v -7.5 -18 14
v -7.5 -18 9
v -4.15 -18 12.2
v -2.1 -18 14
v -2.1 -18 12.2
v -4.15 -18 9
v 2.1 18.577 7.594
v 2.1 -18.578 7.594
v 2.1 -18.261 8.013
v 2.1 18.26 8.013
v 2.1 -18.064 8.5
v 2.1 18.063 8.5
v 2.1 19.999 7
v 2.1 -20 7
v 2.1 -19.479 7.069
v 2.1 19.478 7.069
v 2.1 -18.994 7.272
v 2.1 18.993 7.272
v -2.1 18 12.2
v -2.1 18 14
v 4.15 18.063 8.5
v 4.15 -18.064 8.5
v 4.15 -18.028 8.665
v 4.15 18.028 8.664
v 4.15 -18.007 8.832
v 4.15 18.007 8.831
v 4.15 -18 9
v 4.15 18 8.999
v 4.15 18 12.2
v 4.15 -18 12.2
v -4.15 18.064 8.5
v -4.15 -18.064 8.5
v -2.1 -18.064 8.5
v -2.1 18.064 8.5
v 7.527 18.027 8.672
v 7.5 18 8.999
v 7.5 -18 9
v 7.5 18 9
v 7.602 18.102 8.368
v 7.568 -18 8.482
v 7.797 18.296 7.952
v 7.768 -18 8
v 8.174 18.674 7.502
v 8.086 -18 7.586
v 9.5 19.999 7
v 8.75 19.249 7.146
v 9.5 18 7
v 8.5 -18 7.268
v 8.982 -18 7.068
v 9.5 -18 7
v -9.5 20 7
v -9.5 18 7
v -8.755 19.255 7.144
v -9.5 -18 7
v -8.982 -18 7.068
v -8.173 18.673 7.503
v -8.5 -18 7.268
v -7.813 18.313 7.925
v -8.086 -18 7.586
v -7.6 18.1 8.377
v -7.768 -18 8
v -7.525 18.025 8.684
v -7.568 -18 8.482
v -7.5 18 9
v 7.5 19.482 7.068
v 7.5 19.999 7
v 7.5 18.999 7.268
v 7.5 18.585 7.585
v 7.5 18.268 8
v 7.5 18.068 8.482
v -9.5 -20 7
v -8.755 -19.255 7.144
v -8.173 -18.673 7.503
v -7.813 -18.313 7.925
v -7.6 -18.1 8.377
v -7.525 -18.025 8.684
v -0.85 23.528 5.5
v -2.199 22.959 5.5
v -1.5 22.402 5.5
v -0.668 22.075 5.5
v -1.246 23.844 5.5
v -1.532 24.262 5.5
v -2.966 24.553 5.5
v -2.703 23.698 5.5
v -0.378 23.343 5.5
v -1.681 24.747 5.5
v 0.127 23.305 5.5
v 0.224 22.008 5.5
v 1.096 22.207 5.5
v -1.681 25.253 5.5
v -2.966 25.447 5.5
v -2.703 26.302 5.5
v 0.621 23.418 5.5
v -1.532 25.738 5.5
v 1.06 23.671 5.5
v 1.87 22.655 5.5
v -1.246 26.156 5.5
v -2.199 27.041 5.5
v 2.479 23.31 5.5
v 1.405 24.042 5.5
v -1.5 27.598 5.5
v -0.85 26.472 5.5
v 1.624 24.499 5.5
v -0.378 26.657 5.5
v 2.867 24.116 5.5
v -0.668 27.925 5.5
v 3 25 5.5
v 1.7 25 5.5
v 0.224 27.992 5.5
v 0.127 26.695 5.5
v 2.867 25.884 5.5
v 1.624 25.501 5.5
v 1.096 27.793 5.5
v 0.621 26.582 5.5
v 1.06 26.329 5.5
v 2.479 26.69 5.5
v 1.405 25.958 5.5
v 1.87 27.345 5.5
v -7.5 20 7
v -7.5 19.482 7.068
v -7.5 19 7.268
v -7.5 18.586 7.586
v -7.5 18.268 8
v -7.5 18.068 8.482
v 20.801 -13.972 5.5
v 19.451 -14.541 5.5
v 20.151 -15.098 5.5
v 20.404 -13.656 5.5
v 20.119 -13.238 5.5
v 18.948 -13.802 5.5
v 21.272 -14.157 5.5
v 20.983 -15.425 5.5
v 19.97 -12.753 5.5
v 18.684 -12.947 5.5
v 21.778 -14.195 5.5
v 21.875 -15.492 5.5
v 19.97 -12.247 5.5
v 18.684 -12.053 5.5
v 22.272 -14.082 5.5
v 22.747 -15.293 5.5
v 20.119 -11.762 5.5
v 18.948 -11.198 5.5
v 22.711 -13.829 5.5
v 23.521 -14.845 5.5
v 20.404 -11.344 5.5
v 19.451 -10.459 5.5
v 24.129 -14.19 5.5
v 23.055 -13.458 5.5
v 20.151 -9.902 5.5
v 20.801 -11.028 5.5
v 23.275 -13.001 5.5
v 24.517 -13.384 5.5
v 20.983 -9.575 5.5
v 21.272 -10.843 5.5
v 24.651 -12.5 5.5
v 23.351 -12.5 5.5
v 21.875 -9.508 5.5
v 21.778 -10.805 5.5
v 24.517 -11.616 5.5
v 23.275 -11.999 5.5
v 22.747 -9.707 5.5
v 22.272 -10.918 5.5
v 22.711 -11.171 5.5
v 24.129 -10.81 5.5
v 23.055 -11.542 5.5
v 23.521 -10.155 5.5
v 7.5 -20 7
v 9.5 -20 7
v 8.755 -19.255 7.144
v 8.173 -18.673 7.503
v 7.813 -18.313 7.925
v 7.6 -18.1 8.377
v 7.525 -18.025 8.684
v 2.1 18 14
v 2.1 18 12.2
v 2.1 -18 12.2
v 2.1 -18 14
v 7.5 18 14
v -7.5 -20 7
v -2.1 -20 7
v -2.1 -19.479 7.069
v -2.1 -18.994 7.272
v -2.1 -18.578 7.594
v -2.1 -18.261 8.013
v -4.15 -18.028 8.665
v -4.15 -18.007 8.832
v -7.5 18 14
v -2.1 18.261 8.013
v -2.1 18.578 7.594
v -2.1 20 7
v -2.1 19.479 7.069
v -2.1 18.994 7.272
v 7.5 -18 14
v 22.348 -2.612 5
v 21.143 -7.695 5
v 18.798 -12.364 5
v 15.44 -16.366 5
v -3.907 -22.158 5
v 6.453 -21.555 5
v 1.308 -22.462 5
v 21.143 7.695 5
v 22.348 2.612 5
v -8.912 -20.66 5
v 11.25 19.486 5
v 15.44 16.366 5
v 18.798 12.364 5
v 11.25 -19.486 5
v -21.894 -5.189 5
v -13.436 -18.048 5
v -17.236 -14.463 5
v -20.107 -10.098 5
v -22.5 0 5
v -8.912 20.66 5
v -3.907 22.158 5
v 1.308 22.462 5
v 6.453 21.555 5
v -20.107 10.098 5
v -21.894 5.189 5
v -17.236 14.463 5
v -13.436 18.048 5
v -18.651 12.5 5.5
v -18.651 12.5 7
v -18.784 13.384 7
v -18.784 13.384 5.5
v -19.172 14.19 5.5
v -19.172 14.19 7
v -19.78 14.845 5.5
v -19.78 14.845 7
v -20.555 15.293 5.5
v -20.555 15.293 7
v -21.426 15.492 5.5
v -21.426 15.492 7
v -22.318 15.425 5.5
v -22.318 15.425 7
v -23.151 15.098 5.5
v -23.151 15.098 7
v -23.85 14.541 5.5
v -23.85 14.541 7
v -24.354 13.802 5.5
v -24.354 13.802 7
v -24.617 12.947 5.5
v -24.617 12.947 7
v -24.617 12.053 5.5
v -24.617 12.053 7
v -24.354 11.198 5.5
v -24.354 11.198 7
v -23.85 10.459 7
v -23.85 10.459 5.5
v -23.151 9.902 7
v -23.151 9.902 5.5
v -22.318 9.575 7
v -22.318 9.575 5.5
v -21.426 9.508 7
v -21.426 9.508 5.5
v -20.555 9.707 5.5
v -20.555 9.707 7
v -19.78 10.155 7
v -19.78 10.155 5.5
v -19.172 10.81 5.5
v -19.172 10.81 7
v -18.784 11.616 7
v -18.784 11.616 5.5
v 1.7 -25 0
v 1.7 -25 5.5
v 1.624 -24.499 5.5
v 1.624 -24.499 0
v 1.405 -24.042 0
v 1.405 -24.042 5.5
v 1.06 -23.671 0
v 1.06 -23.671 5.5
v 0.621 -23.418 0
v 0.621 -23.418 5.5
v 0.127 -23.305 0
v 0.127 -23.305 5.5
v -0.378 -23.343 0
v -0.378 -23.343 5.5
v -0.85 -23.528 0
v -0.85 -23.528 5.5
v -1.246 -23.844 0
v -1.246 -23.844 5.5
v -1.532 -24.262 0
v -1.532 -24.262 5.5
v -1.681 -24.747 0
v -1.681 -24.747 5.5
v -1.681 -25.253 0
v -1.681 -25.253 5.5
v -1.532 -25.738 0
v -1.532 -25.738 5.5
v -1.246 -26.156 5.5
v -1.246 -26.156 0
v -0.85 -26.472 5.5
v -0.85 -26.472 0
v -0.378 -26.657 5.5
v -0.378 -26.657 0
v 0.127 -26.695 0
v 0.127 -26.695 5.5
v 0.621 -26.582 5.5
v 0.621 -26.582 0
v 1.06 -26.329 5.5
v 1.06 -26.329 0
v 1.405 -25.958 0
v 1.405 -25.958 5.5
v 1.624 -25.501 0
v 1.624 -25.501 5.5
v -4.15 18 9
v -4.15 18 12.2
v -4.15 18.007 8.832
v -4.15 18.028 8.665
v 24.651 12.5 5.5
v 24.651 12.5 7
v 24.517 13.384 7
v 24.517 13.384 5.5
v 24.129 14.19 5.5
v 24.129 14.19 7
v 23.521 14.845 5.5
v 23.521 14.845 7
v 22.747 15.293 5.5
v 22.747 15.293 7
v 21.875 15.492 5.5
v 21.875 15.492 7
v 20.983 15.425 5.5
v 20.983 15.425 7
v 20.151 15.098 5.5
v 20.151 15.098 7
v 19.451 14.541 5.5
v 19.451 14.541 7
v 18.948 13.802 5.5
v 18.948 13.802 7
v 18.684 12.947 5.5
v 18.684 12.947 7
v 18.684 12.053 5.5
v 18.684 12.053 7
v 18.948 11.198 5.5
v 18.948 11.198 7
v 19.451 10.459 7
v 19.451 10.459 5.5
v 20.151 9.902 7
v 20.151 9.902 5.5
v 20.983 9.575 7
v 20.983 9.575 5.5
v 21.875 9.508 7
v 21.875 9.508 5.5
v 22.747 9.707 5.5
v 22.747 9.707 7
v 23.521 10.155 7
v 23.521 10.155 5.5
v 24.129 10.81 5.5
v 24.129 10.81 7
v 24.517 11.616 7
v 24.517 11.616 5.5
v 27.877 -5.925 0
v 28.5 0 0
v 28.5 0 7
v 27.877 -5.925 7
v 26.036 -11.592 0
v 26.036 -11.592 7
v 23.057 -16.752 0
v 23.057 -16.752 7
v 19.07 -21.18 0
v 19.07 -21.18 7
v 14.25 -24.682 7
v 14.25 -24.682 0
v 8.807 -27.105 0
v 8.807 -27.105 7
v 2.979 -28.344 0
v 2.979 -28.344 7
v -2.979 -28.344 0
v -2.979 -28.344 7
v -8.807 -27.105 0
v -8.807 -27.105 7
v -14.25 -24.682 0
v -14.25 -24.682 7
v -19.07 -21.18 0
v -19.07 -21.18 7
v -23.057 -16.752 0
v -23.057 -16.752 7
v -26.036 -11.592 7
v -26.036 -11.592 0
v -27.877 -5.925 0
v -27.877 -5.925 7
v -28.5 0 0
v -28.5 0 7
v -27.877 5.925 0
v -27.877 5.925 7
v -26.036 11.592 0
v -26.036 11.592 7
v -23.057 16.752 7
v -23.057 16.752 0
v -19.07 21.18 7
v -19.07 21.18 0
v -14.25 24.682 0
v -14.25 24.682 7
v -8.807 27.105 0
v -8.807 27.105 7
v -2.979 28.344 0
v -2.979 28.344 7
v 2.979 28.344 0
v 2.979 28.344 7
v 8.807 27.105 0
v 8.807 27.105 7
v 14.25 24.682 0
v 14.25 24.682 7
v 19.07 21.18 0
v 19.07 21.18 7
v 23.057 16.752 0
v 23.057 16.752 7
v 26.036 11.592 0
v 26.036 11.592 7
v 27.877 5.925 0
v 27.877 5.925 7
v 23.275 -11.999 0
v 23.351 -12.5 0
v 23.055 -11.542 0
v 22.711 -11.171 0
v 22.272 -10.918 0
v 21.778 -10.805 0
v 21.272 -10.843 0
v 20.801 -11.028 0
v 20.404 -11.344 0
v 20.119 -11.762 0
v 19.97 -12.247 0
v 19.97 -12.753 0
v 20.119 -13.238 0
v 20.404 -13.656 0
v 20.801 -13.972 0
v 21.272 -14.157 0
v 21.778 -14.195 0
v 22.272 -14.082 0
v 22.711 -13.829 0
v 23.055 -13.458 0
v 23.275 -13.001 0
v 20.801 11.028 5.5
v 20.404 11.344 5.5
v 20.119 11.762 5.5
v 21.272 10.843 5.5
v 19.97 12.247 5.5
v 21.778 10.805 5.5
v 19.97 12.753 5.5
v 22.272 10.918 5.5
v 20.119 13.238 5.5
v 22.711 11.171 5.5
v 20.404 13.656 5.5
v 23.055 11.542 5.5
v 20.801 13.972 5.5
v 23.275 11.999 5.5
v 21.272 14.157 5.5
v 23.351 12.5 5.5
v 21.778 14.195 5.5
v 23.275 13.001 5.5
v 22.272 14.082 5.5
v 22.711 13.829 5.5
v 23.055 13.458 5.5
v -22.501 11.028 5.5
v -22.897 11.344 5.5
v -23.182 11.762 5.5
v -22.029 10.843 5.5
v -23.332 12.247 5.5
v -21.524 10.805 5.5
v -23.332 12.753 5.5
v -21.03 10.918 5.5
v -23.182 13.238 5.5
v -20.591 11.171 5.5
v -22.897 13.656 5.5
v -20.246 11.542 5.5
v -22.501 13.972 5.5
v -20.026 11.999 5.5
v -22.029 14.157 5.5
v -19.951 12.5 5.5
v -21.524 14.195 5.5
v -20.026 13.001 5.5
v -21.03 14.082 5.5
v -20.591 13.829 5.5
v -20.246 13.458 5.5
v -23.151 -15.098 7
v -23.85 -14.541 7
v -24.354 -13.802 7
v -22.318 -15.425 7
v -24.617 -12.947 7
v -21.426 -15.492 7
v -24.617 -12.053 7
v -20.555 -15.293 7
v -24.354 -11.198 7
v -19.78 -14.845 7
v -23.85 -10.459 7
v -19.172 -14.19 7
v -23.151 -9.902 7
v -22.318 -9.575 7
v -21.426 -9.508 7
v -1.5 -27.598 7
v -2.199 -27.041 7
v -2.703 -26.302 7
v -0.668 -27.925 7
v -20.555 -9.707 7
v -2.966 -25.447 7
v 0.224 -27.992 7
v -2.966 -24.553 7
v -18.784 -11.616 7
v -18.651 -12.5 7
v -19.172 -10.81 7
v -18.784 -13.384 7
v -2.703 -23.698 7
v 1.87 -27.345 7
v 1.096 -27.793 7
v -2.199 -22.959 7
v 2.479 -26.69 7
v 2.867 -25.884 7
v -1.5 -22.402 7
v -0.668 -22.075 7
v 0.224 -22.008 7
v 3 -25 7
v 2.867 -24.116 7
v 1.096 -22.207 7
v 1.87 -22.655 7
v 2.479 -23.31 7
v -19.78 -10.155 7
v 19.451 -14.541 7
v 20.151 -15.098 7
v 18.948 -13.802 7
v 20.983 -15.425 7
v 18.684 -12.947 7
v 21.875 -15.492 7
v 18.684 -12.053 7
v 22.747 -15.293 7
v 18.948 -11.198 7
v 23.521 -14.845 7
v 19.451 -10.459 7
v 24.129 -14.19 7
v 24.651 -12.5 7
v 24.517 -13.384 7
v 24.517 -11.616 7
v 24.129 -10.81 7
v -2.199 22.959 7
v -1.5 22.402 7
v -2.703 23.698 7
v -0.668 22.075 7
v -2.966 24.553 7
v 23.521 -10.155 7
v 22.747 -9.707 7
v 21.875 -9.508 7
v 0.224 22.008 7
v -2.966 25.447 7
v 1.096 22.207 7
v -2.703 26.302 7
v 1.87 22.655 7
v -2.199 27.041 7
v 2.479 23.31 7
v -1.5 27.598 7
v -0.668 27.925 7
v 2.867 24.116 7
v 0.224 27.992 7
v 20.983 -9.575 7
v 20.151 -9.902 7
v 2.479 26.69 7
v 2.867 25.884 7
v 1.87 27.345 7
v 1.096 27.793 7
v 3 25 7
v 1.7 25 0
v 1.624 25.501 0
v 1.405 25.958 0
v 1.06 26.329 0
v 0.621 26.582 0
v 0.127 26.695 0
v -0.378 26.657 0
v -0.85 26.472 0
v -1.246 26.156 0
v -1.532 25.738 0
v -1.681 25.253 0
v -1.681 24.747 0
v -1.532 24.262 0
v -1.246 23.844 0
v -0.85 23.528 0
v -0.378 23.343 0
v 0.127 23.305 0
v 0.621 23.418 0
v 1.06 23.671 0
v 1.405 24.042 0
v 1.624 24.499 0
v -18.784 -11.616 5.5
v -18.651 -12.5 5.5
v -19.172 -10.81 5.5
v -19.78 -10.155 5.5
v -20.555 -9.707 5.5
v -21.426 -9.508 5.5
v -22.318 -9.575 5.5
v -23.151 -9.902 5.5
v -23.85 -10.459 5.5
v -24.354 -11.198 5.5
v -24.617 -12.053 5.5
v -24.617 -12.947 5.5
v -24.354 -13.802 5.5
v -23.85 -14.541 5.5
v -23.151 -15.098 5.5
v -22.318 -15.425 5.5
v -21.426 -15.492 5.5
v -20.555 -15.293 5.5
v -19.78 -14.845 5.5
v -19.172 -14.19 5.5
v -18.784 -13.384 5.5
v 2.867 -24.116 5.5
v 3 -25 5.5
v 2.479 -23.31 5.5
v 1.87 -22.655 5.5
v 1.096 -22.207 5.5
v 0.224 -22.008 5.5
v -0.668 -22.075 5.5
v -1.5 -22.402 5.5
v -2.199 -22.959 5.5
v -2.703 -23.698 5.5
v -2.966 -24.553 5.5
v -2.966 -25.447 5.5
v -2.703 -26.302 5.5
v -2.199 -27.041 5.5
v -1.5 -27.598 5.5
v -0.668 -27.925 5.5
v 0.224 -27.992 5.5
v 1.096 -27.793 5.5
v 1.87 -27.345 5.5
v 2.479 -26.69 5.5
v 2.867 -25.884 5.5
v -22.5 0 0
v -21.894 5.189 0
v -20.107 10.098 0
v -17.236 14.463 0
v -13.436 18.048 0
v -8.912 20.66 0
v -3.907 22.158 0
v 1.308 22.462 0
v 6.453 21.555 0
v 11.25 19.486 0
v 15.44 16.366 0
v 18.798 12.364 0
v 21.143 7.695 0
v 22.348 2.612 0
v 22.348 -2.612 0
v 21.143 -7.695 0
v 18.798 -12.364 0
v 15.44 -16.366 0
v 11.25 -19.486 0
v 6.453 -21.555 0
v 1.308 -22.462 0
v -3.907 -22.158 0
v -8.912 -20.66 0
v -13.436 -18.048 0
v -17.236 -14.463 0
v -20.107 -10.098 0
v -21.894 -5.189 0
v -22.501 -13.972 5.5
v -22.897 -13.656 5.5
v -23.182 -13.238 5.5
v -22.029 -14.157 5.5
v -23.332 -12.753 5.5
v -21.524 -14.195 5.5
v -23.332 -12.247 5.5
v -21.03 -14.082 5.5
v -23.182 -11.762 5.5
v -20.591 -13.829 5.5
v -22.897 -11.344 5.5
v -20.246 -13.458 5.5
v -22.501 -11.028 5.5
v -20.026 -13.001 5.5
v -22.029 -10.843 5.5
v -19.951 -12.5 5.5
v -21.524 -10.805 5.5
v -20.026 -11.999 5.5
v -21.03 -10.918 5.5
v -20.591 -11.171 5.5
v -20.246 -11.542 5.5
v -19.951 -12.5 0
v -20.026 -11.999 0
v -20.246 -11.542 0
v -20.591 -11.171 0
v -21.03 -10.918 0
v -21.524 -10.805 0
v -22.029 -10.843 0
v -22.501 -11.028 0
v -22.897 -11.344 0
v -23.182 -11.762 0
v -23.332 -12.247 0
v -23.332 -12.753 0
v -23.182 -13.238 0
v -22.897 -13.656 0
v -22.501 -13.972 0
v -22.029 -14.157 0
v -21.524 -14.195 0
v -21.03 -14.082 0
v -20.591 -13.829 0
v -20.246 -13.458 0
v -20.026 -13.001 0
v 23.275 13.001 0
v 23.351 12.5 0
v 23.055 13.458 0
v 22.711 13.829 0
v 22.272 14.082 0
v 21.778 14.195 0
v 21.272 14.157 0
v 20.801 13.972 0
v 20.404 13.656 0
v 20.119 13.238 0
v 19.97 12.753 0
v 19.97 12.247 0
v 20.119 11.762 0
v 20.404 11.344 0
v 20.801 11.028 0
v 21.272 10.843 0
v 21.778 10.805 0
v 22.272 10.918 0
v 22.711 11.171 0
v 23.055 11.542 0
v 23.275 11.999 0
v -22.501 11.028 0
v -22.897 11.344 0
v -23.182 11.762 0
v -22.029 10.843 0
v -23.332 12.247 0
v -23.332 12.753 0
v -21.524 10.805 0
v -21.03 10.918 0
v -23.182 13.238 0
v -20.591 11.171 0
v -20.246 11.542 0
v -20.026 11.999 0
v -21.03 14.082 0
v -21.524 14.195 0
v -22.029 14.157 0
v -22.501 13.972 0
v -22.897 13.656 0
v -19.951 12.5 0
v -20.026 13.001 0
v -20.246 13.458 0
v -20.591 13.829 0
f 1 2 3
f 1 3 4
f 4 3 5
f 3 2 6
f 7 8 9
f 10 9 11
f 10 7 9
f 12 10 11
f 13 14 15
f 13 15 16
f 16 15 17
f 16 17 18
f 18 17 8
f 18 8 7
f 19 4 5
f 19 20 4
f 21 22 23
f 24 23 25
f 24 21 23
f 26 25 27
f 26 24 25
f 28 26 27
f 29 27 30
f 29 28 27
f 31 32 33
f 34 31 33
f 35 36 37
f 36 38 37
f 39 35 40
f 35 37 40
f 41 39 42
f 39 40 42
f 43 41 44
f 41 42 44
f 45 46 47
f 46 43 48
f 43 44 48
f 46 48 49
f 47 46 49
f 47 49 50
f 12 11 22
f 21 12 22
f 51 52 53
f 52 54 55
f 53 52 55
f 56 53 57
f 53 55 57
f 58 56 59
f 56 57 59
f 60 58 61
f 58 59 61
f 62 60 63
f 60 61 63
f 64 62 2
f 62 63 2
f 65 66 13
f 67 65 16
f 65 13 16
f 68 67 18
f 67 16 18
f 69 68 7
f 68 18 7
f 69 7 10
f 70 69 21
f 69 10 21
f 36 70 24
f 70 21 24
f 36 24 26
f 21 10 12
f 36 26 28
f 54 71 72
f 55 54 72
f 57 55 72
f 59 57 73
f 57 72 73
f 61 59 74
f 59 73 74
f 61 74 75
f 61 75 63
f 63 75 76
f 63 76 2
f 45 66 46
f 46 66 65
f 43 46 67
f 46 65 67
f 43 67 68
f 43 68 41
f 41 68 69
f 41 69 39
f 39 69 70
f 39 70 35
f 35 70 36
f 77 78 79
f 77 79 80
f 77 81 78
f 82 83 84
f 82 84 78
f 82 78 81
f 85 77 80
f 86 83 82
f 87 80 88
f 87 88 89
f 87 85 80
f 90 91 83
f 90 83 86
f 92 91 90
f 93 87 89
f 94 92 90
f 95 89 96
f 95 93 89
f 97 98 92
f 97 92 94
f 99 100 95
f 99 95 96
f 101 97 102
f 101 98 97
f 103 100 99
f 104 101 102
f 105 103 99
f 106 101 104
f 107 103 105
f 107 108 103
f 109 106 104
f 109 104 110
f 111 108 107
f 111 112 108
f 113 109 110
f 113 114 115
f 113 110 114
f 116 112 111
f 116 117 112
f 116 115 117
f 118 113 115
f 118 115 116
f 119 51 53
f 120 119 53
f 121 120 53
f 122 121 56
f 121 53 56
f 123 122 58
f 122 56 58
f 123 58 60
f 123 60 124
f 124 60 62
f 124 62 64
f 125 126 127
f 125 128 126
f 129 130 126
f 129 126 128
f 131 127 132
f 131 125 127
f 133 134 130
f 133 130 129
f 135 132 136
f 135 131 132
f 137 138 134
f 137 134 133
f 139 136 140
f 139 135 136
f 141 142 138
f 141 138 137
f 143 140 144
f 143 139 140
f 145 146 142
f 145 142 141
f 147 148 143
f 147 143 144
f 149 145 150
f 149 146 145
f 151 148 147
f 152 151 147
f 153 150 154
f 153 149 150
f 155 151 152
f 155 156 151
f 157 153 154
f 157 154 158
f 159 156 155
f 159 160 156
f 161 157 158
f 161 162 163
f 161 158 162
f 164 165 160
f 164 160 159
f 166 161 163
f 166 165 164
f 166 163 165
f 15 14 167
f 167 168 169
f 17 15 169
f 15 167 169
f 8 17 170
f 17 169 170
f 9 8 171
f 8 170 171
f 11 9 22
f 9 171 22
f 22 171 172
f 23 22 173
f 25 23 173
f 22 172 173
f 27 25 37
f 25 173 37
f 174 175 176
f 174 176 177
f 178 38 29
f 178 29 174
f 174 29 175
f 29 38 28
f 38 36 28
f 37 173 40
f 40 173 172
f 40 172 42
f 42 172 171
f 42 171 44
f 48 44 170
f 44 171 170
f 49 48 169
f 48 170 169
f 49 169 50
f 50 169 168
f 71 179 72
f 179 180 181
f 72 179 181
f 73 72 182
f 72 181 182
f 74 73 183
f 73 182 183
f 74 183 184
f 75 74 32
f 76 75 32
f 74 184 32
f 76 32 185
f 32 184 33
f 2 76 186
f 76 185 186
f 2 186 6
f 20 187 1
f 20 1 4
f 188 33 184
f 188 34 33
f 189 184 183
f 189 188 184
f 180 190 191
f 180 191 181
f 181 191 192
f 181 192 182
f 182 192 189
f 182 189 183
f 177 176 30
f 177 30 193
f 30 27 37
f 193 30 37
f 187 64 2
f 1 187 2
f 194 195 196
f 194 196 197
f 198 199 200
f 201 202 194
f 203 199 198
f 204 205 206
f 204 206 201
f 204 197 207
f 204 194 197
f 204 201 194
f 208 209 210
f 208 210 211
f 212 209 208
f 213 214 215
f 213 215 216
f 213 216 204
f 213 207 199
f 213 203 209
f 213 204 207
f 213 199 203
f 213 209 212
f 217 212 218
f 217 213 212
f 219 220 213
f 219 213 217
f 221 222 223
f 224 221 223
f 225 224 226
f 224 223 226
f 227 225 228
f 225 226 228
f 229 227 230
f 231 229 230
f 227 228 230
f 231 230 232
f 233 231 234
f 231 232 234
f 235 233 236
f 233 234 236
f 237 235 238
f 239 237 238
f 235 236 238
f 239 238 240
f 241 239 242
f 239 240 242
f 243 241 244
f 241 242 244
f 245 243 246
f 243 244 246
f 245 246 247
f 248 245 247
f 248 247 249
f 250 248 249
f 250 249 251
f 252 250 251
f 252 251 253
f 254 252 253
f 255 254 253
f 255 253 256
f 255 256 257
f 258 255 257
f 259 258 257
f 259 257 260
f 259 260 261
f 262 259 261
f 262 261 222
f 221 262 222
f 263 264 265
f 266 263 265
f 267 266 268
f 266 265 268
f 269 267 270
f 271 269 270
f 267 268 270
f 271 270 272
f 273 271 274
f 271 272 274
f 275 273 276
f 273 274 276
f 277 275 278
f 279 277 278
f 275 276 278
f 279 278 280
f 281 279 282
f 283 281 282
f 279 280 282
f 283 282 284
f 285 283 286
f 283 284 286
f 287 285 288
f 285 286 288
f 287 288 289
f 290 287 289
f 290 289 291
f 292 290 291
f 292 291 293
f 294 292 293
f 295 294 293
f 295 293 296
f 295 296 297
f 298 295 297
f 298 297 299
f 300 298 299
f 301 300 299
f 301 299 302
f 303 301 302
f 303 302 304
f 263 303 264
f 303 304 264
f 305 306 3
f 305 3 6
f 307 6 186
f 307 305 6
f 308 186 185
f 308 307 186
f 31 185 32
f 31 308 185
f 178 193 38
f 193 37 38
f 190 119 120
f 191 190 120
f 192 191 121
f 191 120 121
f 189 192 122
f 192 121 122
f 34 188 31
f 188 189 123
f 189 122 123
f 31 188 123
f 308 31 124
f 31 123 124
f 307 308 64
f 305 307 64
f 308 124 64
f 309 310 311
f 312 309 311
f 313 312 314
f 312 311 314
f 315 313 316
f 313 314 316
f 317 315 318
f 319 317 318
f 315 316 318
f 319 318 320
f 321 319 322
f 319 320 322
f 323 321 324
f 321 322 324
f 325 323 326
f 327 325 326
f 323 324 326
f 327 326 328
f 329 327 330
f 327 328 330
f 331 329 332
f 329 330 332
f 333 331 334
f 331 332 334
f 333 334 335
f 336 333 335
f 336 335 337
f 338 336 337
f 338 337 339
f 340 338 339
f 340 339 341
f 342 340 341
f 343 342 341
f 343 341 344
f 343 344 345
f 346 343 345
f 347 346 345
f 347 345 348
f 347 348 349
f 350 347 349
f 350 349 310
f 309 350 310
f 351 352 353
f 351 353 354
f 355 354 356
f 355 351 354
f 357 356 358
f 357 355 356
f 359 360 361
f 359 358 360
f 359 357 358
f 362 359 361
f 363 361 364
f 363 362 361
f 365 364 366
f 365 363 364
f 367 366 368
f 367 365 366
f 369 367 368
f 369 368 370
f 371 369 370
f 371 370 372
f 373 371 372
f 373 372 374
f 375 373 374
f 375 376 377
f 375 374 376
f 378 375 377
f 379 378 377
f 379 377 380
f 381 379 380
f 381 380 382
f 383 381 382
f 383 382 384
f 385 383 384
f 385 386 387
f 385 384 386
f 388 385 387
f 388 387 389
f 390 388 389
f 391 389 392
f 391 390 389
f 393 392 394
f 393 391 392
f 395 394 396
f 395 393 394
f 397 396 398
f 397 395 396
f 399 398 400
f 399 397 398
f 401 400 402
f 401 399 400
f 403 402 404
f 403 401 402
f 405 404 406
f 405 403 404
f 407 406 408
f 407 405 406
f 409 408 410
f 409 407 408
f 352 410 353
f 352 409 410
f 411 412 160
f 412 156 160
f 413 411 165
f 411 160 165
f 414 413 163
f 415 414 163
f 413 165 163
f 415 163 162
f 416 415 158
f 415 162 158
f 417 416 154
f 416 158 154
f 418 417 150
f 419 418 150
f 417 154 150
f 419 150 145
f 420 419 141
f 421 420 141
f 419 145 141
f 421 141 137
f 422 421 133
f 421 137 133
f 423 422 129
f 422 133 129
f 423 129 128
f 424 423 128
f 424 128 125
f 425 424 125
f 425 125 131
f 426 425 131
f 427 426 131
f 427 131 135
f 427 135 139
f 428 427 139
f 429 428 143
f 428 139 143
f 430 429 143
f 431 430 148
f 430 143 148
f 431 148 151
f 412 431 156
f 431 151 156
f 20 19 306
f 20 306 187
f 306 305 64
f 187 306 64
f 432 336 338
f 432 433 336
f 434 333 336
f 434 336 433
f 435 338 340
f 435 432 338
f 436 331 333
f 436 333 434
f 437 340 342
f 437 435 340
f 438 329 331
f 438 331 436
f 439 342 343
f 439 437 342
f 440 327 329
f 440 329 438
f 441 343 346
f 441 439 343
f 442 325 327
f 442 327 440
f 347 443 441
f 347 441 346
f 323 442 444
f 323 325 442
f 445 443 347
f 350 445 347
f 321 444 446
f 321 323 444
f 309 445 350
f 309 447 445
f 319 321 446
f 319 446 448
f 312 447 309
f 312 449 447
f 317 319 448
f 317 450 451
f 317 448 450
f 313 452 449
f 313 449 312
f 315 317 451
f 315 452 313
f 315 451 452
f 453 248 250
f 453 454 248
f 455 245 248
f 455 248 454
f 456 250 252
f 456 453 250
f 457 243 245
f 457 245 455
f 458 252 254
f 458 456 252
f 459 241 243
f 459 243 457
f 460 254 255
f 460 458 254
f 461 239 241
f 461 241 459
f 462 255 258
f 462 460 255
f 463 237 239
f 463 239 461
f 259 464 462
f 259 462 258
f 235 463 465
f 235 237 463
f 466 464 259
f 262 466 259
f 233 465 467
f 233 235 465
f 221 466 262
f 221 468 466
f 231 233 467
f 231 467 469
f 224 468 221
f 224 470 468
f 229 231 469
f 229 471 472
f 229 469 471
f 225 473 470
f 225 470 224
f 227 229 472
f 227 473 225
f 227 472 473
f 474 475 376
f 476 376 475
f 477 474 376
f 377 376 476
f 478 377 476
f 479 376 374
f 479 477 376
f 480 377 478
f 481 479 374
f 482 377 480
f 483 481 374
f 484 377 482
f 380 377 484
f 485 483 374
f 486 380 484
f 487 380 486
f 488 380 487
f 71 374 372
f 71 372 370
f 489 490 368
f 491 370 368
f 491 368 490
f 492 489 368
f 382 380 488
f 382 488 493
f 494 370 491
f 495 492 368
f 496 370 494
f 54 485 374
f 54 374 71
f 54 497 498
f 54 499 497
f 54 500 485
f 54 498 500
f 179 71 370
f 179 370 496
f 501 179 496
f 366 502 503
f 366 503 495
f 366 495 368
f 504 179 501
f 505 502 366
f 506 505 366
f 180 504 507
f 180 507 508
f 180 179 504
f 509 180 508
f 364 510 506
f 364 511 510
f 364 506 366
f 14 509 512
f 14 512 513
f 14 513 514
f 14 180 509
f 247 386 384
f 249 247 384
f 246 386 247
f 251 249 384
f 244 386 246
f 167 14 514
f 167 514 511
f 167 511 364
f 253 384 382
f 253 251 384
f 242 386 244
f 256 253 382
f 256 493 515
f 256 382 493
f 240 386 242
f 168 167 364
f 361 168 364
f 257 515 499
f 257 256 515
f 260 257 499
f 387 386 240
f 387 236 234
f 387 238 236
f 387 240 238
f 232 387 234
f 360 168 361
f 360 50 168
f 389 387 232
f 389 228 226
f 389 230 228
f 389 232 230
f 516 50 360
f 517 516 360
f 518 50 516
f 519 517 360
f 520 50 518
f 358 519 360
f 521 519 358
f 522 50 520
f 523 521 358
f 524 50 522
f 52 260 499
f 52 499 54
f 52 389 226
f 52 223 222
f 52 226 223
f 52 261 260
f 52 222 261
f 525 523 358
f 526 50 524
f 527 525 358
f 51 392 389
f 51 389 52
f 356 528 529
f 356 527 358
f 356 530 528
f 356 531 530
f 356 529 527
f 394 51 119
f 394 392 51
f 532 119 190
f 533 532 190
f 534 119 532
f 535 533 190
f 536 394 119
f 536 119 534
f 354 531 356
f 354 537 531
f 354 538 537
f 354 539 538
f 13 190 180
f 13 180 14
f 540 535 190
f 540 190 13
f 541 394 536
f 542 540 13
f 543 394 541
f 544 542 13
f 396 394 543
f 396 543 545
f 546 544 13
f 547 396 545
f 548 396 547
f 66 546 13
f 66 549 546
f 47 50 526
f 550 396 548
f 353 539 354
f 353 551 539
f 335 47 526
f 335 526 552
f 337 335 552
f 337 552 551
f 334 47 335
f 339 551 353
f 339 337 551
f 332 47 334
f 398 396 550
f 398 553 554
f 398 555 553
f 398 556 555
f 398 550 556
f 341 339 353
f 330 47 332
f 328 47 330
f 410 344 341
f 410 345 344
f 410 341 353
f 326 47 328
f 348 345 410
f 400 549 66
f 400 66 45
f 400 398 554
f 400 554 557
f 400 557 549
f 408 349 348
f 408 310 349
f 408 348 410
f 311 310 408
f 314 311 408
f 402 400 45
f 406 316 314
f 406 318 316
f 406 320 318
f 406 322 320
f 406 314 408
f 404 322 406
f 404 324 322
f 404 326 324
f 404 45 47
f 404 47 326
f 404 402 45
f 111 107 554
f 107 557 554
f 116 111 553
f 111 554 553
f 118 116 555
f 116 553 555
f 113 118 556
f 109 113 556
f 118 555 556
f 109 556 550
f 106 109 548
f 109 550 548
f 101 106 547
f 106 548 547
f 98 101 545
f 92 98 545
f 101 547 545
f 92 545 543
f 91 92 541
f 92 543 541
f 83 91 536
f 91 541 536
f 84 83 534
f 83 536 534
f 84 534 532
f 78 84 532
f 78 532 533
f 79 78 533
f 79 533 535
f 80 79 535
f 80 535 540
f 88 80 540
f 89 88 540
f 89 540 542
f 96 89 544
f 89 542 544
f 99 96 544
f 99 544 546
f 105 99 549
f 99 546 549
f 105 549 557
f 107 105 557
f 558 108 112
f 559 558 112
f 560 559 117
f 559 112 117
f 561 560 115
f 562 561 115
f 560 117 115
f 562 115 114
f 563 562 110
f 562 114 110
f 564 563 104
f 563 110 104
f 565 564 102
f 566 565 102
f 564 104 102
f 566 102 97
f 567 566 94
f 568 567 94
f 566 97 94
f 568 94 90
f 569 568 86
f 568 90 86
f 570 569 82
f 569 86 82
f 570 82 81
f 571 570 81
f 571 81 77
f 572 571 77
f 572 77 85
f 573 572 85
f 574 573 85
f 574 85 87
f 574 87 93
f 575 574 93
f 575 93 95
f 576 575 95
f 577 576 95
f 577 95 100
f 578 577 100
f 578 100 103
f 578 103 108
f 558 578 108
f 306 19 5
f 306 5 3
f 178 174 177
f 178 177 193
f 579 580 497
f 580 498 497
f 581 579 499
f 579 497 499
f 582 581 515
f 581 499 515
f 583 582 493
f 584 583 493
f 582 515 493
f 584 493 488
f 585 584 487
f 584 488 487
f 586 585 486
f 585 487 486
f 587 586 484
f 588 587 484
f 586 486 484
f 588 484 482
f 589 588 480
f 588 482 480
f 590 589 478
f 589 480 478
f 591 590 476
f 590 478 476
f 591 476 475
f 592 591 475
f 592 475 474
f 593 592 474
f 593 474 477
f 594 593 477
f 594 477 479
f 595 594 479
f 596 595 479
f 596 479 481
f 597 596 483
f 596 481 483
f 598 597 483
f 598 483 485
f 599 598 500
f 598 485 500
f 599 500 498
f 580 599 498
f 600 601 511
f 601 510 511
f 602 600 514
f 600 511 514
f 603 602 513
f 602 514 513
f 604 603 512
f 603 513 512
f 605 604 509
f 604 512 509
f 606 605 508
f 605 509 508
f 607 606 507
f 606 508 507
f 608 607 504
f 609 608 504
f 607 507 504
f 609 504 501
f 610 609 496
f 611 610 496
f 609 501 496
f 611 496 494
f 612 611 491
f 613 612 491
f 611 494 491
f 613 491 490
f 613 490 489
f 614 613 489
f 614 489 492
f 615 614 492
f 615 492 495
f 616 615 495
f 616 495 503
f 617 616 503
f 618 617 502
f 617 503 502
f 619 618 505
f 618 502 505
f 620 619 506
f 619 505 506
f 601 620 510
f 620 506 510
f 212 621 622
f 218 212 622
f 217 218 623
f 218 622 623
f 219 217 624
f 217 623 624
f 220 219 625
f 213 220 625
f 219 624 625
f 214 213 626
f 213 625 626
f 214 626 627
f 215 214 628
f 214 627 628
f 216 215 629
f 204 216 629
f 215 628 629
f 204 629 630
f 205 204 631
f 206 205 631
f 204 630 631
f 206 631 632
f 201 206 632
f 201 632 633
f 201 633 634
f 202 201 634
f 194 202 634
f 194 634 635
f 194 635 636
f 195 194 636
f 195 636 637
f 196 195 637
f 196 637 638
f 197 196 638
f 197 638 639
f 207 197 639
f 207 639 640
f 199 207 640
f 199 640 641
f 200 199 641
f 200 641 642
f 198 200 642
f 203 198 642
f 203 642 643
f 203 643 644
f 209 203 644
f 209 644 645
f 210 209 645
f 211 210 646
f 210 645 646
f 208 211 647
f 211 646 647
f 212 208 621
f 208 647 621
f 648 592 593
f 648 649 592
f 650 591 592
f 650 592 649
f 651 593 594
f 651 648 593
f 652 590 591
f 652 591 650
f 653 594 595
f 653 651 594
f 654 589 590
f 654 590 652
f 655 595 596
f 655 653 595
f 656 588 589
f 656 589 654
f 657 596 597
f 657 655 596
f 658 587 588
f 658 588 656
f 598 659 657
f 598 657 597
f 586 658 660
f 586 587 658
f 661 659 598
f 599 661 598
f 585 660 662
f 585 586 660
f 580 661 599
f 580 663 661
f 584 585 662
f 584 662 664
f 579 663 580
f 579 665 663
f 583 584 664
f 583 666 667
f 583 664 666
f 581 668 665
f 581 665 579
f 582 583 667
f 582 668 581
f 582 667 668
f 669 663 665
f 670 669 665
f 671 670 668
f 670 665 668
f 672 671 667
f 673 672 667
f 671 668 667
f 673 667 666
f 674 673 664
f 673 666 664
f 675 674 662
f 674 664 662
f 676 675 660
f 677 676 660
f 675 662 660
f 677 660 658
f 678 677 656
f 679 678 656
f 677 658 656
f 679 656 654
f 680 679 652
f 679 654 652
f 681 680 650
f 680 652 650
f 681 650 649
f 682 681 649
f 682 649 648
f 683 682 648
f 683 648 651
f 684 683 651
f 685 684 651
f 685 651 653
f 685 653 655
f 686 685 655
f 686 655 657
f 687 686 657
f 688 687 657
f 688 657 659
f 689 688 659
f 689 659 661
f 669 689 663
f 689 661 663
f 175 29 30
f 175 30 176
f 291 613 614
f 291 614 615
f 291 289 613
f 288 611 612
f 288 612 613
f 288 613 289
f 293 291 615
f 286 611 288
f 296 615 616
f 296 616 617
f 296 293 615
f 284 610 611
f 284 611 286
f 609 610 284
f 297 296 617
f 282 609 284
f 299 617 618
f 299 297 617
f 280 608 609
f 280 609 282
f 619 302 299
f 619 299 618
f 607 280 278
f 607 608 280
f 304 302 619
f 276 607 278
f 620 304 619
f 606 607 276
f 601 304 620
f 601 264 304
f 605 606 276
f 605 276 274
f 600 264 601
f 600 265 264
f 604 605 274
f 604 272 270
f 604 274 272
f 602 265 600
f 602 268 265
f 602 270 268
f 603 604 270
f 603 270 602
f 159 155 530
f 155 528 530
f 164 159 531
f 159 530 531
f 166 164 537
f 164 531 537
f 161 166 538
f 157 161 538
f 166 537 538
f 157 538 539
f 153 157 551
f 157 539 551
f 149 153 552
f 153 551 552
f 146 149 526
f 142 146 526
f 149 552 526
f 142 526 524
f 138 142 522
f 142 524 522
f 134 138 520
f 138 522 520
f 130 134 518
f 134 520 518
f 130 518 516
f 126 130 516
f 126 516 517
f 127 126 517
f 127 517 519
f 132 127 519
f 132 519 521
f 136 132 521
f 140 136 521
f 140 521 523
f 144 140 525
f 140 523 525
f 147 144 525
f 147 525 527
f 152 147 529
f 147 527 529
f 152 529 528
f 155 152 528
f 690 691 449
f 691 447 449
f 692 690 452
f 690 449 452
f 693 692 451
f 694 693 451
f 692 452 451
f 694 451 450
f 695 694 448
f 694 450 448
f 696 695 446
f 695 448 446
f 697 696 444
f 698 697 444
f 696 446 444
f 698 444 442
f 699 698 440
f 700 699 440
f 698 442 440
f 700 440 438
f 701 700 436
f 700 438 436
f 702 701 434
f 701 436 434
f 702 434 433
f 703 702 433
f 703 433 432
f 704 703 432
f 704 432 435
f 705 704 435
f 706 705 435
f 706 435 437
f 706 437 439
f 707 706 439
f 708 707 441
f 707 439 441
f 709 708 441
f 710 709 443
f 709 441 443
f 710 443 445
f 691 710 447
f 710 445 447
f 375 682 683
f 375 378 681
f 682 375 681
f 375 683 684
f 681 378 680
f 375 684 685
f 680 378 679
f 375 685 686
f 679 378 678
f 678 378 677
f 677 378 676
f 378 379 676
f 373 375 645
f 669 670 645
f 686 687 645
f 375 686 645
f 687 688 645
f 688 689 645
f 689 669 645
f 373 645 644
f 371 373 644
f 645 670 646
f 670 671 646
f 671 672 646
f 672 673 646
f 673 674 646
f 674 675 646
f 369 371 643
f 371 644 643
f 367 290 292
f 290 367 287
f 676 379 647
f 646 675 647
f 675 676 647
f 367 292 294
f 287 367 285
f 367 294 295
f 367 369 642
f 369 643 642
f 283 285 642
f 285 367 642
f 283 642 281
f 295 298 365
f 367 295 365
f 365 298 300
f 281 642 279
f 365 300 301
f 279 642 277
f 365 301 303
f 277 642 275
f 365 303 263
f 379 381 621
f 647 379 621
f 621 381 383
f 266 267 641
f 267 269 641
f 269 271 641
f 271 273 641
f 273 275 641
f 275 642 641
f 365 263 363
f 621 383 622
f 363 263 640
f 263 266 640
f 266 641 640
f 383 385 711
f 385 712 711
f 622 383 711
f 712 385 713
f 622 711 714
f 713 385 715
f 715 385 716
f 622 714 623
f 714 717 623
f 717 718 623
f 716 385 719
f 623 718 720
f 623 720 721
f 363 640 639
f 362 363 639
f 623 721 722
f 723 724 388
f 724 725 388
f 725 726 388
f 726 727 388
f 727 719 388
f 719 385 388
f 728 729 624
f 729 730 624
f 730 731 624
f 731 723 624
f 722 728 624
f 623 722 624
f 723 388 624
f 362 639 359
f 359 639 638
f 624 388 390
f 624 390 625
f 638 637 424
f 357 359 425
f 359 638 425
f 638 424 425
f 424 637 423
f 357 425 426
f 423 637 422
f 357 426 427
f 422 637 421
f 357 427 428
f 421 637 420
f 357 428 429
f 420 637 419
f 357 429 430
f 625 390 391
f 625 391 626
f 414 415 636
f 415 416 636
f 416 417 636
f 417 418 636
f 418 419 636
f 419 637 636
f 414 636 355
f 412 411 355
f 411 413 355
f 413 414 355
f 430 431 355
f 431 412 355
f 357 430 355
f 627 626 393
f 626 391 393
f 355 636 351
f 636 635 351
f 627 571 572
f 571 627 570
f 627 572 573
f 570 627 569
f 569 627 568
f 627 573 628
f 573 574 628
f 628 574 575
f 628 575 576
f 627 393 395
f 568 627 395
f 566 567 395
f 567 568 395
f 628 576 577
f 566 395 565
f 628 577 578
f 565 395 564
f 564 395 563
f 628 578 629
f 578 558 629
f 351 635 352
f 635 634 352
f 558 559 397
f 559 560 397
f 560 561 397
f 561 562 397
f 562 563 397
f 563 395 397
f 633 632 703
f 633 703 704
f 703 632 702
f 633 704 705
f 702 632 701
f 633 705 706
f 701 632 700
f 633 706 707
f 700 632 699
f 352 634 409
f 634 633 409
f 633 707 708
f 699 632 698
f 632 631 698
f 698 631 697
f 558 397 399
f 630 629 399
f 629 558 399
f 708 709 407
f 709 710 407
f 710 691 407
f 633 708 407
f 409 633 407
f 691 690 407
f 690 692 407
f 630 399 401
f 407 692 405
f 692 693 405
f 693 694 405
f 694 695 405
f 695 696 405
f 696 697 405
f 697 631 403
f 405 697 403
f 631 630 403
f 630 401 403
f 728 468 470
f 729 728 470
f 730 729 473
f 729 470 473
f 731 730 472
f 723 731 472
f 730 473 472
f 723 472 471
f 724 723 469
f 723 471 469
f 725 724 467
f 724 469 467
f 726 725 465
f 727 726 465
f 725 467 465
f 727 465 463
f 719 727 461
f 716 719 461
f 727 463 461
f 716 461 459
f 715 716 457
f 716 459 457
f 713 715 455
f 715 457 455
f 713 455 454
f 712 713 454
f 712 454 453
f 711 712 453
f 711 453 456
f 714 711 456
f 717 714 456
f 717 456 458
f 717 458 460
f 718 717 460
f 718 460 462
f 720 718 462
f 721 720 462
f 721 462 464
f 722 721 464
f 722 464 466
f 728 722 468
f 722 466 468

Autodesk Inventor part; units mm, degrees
ref_plane "YZ Plane" through (0, 0, 0) normal (1, 0, 0) x (0, 1, 0)
ref_plane "XZ Plane" through (0, 0, 0) normal (0, 1, 0) x (-1, 0, 0)
ref_plane "XY Plane" through (0, 0, 0) normal (0, 0, 1) x (1, 0, 0)
sketch "スケッチ1" plane through (0, 0, 0) normal (0, 0, 1) x (1, 0, 0)
  circle A0 centre (0, 0) radius 28.5
  circle A1 centre (0, 0) radius 20
  dimension "d0" = 57
  dimension "d1" = 40
extrude "押し出し1" add sketch "スケッチ1" along normal blind 10 contours A0 | A1
sketch "スケッチ2" plane through (0, 0, 0) normal (0, 0, -1) x (-1, 0, 0)
  circle A0 centre (0, 0) radius 22.5
  dimension "d4" = 45
extrude "押し出し2" cut sketch "スケッチ2" against normal blind 5
sketch "スケッチ4" plane through (0, 0, 10) normal (0, 0, 1) x (1, 0, 0)
  circle A0 centre (0, 0) radius 25
  circle A1 centre (0, -25) radius 1.7
  circle A2 centre (21.6506, -12.5) radius 1.7
  circle A3 centre (21.6506, 12.5) radius 1.7
  circle A4 centre (0, 25) radius 1.7
  circle A5 centre (-21.6506, 12.5) radius 1.7
  circle A6 centre (-21.6506, -12.5) radius 1.7
  dimension "d15" = 50
  dimension "d16" = 3.4
  dimension "d19" = 360
extrude "押し出し4" cut sketch "スケッチ4" against normal blind 10 contours A3 A0 | A0 A3 | A2 A0 | A0 A2 | A4 A0 | A0 A4 | A1 A0 | A0 A1 | A5 A0 | A0 A5 | A6 A0 | A0 A6
sketch "スケッチ5" plane through (0, 0, 10) normal (0, 0, 1) x (1, 0, 0)
  circle A0 centre (0, 0) radius 28.5
extrude "押し出し5" cut sketch "スケッチ5" against normal blind 3
sketch "スケッチ6" plane through (0, 0, 7) normal (0, 0, 1) x (1, 0, 0)
  circle A0 centre (0, 0) radius 21.5
  circle A1 centre (0, 25) radius 1.7 projected
  circle A2 centre (0, 25) radius 3
  circle A3 centre (-21.6506, 12.5) radius 3
  circle A4 centre (-21.6506, -12.5) radius 3
  circle A5 centre (0, -25) radius 3
  circle A6 centre (21.6506, -12.5) radius 3
  circle A7 centre (21.6506, 12.5) radius 3
  dimension "d25" = 43
  dimension "d26" = 6
  dimension "d29" = 360
extrude "押し出し6" cut sketch "スケッチ6" against normal blind 1.5 contours A1 | A2 | A3 | A4 | A5 | A6 | A7
sketch "スケッチ7" plane through (0, 0, 7) normal (0, 0, 1) x (1, 0, 0)
  line L0 (0, 0) -> (7.5, 0)
  line L1 (7.5, 0) -> (7.5, 18)
  line L2 (7.5, 18) -> (-7.5, 18)
  line L3 (-7.5, 18) -> (-7.5, -18)
  line L4 (-7.5, -18) -> (7.5, -18)
  line L5 (7.5, -18) -> (7.5, 0)
  dimension "d33" = 7.5
  dimension "d34" = 18
  dimension "d35" = 15
  dimension "d36" = 36
extrude "押し出し7" add sketch "スケッチ7" along normal blind 7
sketch "スケッチ8" plane through (-7.5, 18, 7) normal (0, 1, 0) x (1, 0, 0)
  line L0 (15, 0) -> (0, 0) projected
  line L1 (7.5, 0) -> (9.6, 0)
  line L2 (9.6, 0) -> (9.6, -1.5)
  line L3 (9.6, -1.5) -> (5.4, -1.5)
  line L4 (5.4, -1.5) -> (5.4, 0)
  line L5 (7.5, 0) -> (5.4, 0)
  line L6 (7.5, -1.5) -> (11.65, -1.5)
  line L7 (11.65, -1.5) -> (11.65, -5.2)
  line L8 (11.65, -5.2) -> (3.35, -5.2)
  line L9 (3.35, -5.2) -> (3.35, -1.5)
  line L10 (3.35, -1.5) -> (7.5, -1.5)
  line L11 (7.5, -5.2) -> (9.6, -5.2)
  line L12 (9.6, -5.2) -> (9.6, -7)
  line L13 (0, -7) -> (15, -7) projected
  line L14 (9.6, -7) -> (5.4, -7)
  line L15 (5.4, -7) -> (5.4, -5.2)
  point P0 (7.5, 7)
  dimension "d39" = 2.1
  dimension "d40" = 1.5
  dimension "d41" = 4.2
  dimension "d42" = 4.15
  dimension "d43" = 3.7
  dimension "d44" = 8.3
  dimension "d45" = 2.1
extrude "押し出し8" cut sketch "スケッチ8" against normal blind 40
fillet "フィレット1" radius 2 6 edges at (-4.8, -18, 7) (4.8, -18, 7) (7.5, 0, 7) (-7.5, 0, 7) (-4.8, 18, 7) (4.8, 18, 7)
properties part number "piper-GIM3505-8" material "ABS プラスチック"
